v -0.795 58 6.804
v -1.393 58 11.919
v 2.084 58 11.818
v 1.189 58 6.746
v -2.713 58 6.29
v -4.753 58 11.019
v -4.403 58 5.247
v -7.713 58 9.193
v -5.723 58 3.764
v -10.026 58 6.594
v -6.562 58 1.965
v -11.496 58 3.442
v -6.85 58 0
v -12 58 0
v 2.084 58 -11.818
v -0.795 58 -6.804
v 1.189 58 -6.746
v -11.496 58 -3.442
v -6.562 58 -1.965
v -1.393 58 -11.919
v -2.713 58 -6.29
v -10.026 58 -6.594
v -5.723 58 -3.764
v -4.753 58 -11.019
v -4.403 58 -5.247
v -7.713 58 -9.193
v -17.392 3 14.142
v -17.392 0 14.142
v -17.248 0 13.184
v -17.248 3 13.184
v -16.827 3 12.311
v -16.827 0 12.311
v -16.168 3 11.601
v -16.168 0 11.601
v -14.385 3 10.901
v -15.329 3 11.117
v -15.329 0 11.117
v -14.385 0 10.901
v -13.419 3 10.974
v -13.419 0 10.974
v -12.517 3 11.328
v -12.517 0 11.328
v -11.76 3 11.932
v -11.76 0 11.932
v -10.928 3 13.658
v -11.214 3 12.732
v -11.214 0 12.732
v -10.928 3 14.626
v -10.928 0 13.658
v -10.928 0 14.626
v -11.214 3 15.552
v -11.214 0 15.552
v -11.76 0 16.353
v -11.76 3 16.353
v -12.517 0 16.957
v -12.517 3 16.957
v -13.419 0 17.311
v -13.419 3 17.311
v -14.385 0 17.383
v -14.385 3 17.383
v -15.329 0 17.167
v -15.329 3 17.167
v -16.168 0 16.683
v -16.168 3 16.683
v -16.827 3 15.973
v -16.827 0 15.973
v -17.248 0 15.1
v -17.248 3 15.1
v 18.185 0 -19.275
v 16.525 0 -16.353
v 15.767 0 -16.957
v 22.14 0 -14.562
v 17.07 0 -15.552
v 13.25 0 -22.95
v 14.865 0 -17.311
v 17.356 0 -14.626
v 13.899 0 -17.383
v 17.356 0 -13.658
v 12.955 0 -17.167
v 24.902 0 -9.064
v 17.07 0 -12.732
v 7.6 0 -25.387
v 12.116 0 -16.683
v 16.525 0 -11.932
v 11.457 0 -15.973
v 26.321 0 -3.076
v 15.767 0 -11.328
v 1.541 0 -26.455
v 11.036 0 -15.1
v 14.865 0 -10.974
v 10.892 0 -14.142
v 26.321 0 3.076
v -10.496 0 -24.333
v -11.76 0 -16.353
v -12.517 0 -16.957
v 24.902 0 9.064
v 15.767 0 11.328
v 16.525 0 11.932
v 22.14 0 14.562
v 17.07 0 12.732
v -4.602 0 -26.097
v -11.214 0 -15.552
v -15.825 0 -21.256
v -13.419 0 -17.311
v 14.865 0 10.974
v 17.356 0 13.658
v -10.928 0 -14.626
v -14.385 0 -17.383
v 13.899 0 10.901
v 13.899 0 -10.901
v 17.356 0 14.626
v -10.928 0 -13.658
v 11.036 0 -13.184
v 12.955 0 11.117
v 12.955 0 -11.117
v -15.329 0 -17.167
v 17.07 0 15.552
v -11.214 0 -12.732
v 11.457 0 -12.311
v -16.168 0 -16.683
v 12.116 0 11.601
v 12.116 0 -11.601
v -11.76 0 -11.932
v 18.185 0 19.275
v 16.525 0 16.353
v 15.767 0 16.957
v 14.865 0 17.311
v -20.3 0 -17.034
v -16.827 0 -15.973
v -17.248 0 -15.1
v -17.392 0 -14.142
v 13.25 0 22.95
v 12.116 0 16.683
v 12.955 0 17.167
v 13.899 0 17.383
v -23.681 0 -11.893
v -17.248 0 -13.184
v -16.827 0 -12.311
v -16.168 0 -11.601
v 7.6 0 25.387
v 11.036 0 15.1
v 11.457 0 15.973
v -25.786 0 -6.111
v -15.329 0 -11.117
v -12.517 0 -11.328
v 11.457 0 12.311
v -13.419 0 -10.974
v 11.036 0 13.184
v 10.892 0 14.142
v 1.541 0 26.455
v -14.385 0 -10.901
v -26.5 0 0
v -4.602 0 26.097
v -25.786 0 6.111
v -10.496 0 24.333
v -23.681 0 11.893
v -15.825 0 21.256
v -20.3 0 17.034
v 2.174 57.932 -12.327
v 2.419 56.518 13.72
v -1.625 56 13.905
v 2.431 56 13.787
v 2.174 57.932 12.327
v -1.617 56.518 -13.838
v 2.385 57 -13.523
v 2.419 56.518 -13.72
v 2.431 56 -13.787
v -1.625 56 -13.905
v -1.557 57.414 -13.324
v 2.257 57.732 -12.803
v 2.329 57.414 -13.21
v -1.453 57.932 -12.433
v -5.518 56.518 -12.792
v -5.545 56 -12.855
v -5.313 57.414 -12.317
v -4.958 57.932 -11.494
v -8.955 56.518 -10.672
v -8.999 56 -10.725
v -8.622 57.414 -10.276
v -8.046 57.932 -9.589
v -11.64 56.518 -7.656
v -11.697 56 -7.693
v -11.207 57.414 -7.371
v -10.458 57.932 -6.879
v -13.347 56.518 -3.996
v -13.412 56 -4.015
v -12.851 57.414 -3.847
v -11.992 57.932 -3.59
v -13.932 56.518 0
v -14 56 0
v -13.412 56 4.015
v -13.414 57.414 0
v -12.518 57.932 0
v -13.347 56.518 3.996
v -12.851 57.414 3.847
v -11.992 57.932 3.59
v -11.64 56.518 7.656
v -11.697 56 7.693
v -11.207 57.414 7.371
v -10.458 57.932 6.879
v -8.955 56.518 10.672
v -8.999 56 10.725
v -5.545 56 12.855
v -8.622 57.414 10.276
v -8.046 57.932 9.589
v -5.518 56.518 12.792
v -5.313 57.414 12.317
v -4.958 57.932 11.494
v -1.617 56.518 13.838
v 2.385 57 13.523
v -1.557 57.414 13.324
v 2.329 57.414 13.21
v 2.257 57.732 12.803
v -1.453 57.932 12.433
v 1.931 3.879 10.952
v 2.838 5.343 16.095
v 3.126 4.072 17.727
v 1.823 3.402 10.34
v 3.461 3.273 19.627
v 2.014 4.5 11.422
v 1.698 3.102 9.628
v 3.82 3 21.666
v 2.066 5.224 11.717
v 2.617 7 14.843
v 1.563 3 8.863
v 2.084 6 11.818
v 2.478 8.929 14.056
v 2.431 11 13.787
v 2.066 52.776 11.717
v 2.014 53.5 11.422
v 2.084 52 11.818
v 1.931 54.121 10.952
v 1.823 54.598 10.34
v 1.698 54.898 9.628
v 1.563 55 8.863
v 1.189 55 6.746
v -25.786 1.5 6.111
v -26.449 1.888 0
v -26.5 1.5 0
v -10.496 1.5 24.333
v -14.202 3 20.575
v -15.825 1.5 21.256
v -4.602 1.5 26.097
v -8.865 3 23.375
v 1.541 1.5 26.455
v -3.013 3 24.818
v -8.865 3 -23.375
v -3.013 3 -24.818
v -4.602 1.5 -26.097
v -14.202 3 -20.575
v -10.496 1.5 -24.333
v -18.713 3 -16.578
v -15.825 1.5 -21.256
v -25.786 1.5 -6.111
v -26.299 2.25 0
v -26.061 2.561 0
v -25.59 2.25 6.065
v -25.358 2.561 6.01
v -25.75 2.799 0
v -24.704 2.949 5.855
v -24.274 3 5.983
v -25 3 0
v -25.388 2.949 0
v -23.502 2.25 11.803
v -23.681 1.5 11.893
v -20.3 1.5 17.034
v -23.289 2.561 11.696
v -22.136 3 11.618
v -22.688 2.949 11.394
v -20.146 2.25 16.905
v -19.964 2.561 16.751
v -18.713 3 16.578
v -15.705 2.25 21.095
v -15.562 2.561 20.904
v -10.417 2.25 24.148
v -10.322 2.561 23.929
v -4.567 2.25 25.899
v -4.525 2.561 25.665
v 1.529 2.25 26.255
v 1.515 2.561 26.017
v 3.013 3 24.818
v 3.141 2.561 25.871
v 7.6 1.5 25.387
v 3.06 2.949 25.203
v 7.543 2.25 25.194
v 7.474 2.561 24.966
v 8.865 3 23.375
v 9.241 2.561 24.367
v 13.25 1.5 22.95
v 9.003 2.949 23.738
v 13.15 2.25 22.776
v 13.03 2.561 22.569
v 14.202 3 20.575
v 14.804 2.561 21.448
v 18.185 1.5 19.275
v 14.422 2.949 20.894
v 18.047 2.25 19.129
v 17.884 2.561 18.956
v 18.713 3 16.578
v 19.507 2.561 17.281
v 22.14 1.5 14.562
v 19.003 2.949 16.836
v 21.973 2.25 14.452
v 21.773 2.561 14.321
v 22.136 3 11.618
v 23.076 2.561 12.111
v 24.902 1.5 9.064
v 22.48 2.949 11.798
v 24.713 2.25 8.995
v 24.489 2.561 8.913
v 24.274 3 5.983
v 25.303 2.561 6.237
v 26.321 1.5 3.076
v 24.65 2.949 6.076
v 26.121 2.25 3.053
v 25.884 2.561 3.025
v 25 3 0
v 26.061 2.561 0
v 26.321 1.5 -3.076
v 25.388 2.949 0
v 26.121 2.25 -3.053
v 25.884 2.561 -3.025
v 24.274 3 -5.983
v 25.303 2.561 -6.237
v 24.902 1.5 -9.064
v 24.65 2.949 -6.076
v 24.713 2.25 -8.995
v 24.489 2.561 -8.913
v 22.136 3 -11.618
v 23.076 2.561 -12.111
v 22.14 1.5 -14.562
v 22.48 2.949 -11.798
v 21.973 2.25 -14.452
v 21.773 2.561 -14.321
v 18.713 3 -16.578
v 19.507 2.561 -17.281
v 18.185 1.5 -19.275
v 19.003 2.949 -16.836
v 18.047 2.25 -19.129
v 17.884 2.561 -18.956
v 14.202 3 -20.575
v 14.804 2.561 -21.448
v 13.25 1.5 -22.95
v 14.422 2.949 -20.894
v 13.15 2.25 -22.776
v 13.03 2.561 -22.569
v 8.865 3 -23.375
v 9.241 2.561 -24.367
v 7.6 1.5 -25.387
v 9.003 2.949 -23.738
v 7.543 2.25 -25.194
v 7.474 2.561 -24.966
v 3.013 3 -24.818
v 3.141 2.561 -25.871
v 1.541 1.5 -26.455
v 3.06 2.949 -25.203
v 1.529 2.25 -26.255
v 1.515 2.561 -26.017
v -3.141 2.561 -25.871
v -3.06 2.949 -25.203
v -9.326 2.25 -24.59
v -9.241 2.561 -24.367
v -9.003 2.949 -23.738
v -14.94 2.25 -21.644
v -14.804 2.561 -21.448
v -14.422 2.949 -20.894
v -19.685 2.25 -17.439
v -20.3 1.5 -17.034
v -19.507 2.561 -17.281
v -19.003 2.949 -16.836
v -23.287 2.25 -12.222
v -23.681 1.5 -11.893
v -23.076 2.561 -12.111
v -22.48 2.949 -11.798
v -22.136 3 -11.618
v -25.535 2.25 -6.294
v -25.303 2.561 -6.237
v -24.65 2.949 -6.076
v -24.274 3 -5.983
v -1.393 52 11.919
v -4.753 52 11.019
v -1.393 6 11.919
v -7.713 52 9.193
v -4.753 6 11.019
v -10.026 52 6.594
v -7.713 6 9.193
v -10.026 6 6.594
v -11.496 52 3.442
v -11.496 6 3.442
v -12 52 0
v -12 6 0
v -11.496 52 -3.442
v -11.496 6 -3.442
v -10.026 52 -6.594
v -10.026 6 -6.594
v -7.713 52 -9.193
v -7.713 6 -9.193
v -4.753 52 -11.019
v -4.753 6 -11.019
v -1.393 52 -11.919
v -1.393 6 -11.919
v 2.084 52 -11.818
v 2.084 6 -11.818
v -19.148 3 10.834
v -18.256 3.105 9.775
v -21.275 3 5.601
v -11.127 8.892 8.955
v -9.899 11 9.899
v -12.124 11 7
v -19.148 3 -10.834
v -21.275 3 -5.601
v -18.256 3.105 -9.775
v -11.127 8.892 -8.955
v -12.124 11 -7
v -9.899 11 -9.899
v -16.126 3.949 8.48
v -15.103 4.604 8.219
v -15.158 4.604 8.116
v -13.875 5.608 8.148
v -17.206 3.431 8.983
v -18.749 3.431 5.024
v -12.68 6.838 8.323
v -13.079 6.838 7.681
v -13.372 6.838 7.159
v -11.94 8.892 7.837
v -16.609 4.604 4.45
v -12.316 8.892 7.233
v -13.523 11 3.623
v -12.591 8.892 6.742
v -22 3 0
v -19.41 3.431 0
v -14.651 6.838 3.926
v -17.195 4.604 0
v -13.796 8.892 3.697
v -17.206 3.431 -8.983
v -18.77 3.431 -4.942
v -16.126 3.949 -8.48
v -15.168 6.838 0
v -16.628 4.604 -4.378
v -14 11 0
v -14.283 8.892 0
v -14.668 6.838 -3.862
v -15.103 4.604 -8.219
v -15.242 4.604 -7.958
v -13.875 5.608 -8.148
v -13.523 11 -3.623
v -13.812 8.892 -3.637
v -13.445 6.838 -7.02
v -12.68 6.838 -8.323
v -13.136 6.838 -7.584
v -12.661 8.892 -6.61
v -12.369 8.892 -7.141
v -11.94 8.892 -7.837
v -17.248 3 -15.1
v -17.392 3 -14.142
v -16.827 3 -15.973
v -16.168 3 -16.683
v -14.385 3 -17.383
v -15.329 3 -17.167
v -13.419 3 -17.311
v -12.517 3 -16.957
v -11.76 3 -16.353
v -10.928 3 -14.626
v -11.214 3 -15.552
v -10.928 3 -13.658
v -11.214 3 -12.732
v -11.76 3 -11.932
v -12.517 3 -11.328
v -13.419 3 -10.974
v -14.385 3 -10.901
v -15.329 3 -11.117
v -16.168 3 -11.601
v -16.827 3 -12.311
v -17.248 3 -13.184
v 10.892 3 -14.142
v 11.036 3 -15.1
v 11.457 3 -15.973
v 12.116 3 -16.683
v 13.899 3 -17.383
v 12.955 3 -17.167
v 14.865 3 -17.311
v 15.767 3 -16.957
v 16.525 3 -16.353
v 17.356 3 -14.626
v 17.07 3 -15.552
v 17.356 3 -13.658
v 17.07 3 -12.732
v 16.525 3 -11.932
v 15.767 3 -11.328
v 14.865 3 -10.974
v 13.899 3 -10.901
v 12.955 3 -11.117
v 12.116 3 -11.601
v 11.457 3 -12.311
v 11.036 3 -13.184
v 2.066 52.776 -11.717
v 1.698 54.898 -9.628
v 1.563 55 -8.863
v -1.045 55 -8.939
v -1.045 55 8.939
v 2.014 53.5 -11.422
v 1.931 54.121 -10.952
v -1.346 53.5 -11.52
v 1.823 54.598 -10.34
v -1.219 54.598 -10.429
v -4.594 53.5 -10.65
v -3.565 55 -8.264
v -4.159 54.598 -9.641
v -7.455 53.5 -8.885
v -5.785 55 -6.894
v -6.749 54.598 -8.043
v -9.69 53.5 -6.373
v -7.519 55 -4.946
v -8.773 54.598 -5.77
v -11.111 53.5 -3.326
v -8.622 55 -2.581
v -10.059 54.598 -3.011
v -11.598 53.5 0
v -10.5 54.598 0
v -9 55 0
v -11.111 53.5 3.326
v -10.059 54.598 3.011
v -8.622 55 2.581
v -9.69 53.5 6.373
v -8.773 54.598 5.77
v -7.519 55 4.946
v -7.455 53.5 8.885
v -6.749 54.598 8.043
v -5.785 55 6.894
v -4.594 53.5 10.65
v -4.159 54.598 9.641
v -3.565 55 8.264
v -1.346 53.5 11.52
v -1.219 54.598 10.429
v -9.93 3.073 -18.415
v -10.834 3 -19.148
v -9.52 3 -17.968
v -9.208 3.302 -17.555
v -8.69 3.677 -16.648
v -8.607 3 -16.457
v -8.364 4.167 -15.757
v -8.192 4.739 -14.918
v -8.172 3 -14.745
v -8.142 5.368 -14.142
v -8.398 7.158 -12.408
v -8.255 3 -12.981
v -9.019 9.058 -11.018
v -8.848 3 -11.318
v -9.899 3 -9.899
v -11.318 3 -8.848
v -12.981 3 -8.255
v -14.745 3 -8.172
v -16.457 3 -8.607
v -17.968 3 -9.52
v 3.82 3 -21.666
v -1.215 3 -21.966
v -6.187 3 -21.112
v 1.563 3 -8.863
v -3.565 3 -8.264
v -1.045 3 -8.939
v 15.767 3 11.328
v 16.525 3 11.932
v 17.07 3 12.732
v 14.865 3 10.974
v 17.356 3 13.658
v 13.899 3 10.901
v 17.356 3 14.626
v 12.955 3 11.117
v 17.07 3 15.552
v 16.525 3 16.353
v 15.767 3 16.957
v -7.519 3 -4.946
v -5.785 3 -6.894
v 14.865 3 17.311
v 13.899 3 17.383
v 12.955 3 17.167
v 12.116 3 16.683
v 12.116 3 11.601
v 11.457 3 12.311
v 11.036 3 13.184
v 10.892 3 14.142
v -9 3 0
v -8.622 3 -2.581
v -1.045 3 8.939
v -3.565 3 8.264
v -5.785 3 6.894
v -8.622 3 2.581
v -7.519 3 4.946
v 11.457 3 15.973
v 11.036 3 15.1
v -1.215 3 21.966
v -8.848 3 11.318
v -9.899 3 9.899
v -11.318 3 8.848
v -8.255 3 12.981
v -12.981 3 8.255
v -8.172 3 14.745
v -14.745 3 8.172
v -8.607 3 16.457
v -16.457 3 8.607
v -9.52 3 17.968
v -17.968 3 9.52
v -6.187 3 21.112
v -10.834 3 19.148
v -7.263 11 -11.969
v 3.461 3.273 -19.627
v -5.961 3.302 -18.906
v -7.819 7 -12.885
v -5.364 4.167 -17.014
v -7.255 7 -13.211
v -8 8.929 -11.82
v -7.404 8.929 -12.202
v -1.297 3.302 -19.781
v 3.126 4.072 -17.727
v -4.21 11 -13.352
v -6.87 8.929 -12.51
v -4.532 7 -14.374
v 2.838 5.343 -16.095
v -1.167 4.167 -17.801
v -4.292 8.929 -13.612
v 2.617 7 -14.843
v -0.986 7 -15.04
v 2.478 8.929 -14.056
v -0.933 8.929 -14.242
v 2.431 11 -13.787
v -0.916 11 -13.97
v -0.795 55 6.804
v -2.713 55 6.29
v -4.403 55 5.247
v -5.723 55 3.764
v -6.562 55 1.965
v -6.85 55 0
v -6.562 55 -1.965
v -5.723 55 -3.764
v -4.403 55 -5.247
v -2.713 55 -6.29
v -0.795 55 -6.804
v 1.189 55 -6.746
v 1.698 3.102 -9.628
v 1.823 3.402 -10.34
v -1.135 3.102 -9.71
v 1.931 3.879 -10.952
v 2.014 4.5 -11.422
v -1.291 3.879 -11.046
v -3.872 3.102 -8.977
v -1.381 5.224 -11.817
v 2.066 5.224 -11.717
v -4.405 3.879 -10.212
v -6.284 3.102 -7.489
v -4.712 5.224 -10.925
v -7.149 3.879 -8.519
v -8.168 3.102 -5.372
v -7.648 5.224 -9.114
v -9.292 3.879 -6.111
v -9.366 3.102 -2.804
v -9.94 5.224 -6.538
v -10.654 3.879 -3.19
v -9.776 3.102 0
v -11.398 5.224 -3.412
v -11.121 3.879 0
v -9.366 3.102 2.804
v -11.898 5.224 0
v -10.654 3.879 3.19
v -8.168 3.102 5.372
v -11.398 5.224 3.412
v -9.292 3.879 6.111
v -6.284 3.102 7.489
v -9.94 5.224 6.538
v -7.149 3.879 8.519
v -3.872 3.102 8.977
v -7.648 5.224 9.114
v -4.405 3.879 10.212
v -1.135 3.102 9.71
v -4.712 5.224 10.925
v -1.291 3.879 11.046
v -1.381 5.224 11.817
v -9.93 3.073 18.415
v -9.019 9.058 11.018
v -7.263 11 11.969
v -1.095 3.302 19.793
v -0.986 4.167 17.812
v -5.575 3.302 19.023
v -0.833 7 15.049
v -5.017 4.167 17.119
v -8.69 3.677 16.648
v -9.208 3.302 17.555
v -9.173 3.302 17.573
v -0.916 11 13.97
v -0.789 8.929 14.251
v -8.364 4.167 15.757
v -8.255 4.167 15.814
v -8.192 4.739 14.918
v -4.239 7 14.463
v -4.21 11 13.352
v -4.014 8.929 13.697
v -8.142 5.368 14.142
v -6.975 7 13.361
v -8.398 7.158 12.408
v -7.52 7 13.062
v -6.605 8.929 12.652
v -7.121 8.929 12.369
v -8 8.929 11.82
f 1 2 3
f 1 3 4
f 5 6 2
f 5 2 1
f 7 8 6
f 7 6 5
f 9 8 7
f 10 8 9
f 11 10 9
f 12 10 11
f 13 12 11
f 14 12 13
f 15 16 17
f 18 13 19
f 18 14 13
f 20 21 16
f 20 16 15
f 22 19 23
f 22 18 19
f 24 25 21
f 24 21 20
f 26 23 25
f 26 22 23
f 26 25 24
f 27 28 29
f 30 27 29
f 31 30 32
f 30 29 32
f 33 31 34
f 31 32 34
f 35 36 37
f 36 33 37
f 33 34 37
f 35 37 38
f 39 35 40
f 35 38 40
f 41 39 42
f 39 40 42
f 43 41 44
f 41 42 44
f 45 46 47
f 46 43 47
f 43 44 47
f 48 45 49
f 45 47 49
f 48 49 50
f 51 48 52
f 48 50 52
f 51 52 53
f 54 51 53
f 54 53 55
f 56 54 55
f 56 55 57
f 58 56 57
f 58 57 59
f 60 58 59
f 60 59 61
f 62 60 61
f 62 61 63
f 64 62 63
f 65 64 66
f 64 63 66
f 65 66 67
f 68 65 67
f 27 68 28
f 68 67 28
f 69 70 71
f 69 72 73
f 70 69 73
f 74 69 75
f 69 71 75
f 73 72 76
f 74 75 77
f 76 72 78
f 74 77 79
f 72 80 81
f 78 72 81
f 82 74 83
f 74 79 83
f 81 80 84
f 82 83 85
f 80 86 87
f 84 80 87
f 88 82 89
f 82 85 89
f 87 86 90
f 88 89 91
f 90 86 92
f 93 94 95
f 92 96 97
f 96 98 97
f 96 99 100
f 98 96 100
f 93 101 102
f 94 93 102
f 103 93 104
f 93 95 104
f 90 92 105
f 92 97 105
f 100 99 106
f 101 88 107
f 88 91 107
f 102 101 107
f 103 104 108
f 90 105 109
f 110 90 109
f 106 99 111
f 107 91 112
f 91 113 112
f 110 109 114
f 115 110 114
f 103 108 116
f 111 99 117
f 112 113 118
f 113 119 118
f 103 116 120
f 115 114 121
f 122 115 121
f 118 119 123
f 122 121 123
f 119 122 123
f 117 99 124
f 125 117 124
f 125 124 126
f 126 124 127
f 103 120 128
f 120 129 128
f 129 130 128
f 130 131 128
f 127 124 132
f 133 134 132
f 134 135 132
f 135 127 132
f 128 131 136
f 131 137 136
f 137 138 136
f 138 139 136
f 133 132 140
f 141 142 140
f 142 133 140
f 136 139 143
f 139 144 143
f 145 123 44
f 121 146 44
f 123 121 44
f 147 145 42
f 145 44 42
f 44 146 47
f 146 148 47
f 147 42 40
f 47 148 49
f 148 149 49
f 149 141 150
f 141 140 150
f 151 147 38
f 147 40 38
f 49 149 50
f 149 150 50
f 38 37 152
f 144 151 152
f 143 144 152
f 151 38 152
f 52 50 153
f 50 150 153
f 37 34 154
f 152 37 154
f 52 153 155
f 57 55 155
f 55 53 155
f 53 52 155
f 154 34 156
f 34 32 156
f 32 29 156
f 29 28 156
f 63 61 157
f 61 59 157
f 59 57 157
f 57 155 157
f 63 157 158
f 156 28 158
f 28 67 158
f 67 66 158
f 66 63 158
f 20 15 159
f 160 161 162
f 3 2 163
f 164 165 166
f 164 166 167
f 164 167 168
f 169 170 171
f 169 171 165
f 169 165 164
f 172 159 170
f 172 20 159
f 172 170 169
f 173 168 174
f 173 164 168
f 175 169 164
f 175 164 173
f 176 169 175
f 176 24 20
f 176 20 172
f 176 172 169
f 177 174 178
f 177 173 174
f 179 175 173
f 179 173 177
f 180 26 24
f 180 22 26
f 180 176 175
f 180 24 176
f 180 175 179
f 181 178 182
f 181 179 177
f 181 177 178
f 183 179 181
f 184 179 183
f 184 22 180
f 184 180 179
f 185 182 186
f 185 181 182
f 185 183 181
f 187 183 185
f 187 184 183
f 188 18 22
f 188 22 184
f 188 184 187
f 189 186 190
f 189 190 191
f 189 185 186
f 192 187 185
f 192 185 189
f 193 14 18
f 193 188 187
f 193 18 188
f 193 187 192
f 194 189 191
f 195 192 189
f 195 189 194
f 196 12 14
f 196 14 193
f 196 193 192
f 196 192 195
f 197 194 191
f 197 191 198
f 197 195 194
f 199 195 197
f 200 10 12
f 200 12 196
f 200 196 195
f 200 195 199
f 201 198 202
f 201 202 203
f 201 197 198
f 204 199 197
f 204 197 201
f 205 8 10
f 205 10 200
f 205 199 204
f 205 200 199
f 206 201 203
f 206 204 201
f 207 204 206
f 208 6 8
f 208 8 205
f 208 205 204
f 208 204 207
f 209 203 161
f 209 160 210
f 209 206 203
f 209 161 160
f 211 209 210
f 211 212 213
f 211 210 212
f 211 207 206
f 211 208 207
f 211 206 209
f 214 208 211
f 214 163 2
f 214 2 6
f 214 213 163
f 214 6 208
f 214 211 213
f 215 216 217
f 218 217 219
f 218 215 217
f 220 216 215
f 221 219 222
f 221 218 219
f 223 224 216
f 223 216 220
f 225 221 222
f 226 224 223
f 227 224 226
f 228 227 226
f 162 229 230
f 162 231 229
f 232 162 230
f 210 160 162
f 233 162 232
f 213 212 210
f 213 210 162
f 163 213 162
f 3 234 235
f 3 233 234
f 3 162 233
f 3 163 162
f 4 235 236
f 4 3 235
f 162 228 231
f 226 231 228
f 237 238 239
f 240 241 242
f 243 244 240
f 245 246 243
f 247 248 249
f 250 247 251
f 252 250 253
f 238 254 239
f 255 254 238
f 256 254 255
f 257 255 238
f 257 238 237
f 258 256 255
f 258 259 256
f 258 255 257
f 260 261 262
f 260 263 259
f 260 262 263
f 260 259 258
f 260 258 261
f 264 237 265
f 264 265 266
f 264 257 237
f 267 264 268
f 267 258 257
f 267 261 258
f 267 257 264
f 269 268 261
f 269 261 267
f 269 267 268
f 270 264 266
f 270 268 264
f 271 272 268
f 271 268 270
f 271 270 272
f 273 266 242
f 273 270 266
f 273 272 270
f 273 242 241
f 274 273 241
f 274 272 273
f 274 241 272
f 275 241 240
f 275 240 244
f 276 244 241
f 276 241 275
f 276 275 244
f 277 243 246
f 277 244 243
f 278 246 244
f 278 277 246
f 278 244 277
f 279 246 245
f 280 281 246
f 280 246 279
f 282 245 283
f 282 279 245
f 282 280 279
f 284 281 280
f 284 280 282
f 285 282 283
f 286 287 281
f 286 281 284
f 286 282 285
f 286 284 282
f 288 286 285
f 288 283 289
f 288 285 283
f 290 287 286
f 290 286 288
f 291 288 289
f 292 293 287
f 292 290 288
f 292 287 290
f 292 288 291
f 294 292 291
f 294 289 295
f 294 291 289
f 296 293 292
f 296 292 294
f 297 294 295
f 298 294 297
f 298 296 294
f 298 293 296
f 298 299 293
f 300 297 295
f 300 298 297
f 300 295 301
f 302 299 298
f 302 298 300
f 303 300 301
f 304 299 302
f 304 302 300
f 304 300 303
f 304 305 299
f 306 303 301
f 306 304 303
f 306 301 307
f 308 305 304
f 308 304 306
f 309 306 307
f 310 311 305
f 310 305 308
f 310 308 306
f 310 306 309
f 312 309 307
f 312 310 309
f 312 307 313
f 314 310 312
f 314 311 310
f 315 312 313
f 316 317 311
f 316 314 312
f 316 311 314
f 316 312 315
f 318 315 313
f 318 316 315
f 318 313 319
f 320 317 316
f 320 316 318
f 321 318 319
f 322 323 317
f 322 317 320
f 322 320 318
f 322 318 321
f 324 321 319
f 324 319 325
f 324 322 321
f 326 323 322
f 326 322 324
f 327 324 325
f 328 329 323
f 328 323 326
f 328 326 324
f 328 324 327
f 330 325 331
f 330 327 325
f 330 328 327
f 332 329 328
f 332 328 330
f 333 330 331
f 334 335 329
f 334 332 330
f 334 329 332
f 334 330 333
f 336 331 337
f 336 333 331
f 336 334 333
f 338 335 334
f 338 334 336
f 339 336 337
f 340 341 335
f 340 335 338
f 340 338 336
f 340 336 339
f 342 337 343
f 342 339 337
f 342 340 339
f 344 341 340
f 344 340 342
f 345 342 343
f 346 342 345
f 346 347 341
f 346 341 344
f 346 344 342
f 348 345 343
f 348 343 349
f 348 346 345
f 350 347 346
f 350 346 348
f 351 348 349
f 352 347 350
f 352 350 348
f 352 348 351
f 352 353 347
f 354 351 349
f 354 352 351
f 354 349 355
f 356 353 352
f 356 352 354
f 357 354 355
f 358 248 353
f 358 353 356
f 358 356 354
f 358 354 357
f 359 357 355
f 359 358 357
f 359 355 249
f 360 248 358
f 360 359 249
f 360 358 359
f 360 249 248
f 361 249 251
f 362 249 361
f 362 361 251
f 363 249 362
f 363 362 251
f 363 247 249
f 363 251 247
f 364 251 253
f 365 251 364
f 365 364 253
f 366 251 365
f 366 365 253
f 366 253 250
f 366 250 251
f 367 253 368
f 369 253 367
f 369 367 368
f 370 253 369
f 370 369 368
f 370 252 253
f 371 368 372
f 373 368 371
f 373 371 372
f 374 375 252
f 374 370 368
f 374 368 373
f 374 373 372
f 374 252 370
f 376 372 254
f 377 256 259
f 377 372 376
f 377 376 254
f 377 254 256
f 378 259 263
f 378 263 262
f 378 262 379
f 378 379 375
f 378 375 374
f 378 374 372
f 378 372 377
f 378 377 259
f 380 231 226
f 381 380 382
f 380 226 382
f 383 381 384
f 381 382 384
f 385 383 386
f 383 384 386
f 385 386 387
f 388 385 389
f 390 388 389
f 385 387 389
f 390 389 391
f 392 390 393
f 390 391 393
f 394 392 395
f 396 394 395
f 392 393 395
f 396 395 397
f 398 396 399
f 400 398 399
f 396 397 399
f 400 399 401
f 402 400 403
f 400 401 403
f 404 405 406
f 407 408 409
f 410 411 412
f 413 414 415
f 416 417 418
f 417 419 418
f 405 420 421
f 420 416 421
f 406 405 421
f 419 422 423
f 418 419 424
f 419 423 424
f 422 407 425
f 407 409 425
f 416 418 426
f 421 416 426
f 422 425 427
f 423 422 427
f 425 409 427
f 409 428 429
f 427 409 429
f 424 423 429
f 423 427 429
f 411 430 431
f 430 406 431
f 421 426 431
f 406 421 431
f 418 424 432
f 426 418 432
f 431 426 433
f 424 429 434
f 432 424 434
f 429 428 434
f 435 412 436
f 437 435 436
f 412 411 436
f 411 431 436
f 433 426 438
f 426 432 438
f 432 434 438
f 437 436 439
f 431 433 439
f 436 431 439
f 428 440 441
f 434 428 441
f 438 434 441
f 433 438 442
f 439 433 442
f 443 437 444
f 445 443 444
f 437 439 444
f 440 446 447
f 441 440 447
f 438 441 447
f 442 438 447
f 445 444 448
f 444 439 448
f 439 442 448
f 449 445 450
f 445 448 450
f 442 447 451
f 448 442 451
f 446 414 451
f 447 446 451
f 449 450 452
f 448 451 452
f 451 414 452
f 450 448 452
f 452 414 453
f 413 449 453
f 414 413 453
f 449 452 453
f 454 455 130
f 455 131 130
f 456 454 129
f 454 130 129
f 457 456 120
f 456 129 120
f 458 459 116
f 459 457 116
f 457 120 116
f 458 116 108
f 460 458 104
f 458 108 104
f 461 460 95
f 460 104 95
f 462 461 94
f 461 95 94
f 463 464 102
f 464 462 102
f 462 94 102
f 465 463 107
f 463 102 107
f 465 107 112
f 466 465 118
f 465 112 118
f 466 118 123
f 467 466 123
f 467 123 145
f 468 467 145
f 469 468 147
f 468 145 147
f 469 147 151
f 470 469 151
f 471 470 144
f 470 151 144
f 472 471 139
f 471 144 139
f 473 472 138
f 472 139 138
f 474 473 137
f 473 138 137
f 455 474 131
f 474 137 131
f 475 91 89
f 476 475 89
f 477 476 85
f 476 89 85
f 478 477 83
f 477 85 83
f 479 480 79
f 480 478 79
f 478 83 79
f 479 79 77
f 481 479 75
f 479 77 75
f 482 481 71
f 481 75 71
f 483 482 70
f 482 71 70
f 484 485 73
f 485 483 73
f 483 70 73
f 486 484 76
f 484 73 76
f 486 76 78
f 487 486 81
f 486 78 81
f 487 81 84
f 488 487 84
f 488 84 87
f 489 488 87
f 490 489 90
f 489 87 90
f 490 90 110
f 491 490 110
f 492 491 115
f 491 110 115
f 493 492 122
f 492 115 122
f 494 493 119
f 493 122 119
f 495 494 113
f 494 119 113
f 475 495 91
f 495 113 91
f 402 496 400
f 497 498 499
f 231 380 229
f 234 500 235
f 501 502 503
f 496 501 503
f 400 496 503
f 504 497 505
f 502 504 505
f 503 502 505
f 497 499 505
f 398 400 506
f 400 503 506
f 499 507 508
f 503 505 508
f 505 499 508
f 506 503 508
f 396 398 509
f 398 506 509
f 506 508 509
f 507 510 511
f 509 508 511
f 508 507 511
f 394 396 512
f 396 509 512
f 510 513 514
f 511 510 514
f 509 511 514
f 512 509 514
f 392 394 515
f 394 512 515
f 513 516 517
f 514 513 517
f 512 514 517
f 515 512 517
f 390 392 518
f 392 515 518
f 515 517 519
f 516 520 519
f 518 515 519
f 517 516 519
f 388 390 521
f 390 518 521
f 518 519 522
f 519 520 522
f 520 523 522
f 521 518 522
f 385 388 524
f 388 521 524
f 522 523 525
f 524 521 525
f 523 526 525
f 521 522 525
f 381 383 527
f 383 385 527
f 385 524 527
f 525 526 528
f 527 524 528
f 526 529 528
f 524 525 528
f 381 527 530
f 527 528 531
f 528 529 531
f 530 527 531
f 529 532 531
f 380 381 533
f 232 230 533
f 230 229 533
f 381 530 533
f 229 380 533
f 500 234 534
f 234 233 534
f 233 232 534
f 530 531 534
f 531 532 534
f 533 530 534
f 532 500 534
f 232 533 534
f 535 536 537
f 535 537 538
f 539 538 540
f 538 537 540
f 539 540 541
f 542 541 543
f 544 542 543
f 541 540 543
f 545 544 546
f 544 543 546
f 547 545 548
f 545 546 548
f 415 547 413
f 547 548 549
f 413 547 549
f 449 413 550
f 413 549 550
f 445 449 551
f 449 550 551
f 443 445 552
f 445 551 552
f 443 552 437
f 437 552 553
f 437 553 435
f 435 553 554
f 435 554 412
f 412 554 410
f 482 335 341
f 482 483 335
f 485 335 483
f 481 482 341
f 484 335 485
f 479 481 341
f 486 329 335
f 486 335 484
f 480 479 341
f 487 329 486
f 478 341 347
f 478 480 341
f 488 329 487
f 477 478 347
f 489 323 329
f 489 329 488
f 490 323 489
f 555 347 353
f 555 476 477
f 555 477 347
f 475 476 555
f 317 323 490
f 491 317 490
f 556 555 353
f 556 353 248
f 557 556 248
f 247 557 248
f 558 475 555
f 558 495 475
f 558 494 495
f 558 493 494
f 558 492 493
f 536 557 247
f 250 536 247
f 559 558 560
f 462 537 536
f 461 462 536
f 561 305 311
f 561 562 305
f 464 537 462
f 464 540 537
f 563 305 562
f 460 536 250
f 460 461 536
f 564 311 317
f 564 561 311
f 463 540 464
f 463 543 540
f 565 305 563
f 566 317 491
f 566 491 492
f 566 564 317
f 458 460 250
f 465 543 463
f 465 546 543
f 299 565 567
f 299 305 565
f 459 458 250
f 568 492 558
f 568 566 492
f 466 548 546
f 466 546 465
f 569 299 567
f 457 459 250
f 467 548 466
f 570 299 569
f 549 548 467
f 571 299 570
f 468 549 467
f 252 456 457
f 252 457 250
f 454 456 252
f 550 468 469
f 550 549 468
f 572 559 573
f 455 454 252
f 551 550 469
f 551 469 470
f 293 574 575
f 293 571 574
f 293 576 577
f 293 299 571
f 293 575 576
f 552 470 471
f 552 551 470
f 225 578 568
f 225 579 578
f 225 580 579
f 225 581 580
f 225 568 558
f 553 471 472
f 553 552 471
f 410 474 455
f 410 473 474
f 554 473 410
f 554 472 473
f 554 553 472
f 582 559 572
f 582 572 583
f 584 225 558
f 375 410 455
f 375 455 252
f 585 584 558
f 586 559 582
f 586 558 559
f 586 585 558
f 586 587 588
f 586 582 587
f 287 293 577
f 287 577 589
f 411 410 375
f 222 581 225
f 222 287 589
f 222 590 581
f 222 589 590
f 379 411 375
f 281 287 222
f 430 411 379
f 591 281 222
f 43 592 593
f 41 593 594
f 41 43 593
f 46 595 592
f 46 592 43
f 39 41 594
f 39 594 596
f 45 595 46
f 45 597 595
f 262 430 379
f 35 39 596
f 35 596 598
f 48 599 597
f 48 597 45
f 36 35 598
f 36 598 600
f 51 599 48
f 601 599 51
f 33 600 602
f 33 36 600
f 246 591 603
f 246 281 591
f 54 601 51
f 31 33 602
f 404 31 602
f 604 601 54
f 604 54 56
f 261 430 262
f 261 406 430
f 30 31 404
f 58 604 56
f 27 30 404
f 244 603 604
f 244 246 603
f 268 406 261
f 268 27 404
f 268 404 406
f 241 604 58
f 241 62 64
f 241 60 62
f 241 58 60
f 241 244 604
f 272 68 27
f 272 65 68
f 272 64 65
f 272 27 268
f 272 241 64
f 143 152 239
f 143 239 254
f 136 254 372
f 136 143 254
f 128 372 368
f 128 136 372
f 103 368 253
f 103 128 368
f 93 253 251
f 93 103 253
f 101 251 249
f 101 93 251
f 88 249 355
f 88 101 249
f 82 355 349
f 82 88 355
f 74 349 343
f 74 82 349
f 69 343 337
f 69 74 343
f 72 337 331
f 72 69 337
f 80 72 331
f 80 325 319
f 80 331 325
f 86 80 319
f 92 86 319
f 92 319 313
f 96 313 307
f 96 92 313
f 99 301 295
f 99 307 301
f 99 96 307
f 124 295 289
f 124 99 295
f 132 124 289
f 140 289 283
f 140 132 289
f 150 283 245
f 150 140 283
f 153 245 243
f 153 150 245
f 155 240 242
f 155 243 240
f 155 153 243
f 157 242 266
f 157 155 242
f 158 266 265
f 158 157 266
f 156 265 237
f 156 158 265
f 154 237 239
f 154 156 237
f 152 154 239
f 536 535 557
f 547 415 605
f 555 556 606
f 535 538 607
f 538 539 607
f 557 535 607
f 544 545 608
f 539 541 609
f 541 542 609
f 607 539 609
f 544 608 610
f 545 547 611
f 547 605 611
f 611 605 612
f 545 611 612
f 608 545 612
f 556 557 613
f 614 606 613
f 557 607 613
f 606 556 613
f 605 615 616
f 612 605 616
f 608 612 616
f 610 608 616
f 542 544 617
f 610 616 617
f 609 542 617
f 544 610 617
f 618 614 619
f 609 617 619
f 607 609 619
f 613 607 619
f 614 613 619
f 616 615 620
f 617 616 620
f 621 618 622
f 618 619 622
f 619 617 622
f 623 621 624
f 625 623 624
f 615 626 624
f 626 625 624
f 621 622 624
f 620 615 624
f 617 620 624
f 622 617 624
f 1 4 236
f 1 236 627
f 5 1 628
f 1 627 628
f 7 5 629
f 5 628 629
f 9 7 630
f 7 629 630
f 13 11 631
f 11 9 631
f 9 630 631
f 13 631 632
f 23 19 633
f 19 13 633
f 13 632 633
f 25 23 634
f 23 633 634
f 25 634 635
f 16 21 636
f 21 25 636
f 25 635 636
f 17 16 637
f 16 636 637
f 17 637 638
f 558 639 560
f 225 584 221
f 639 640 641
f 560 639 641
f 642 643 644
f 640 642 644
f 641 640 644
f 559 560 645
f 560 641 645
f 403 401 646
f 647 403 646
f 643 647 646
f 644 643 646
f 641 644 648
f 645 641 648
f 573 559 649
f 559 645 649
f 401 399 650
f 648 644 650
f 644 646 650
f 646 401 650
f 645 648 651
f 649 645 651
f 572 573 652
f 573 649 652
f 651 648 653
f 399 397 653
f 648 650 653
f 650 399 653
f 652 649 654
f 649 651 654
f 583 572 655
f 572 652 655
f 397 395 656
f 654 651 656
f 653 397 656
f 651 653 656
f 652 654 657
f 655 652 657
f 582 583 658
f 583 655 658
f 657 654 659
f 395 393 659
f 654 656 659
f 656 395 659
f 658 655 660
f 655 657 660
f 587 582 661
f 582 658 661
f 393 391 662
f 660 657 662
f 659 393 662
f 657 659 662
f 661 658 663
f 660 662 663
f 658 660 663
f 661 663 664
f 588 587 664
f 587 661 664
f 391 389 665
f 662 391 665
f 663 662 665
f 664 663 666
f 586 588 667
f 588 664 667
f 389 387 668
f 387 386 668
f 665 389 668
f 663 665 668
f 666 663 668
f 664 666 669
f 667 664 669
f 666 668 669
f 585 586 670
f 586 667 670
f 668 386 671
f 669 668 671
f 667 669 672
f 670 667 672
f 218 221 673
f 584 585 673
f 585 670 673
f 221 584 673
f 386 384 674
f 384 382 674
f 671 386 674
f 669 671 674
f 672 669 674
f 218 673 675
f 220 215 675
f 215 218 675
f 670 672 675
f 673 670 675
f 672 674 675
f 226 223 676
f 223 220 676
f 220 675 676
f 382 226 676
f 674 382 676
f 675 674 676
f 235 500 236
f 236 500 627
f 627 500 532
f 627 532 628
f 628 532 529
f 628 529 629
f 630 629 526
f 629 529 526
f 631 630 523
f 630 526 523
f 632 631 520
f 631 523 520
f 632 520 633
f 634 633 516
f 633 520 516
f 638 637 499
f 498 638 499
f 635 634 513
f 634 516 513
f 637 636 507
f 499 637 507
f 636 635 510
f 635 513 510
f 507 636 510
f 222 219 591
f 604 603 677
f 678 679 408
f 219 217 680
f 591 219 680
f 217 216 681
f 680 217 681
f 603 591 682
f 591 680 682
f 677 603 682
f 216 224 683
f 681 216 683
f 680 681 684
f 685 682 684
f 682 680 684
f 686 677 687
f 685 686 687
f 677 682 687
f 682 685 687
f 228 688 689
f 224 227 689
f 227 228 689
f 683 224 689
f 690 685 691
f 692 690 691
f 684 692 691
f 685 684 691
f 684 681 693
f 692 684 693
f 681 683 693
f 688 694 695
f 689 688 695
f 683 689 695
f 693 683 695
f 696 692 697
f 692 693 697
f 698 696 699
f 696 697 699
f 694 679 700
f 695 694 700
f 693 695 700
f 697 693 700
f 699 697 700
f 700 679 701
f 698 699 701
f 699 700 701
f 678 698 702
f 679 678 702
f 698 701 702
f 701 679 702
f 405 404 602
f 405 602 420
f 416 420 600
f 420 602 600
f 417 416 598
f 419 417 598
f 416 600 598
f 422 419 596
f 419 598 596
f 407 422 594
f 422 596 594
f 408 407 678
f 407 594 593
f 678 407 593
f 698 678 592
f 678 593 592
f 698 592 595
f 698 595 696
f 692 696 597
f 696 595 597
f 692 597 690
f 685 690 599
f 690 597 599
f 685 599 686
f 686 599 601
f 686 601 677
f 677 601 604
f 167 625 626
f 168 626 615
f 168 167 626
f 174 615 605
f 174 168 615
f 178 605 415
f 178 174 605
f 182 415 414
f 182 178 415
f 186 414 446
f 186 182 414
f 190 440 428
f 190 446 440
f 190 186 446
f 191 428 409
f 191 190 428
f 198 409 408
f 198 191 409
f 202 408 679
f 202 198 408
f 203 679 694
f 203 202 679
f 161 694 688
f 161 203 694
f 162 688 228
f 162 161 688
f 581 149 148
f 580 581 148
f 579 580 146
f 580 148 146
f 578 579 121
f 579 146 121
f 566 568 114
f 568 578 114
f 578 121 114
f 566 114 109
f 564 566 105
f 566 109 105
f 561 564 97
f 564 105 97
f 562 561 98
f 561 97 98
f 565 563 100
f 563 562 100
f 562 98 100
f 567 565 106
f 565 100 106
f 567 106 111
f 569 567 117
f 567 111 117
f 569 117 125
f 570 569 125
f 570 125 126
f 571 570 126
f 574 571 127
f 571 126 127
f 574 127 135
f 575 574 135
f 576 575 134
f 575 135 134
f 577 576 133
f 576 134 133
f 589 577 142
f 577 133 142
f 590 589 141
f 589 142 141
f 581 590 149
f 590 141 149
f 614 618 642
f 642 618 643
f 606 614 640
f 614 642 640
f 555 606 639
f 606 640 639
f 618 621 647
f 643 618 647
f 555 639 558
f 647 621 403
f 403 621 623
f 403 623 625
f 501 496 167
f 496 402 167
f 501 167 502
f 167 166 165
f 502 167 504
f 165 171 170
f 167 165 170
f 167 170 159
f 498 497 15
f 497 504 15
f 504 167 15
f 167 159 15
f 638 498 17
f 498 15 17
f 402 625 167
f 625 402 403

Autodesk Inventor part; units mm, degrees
ref_plane "YZ Plane" through (0, 0, 0) normal (1, 0, 0) x (0, 1, 0)
ref_plane "XZ Plane" through (0, 0, 0) normal (0, 1, 0) x (-1, 0, 0)
ref_plane "XY Plane" through (0, 0, 0) normal (0, 0, 1) x (1, 0, 0)
sketch "Sketch1" plane through (0, 0, 0) normal (0, 1, 0) x (-1, 0, 0)
  circle A0 centre (0, 0) radius 26.5
  circle A1 centre (-14.1421, 14.1421) radius 3.25
  circle A2 centre (-14.1421, -14.1421) radius 3.25
  circle A3 centre (14.1421, -14.1421) radius 3.25
  circle A4 centre (14.1421, 14.1421) radius 3.25
  line L0 (0, 0) -> (0, 26.5) construction
  line L1 (0, 0) -> (-18.7383, 18.7383) construction
  dimension "d0" = 53
  dimension "d1" = 6.5
  dimension "d2" = 20
  dimension "d5" = 360
  dimension "d9" = 45
extrude "Extrusion1" add sketch "Sketch1" along normal blind 3
sketch "Sketch2" plane through (0, 0, 0) normal (0, 0, 1) x (1, 0, 0)
  line L0 (26.5, 3) -> (-26.5, 3) projected
  line L1 (-12, 3) -> (-14, 3)
  line L2 (-14, 3) -> (-14, 58)
  line L3 (-14, 58) -> (-12, 58)
  line L4 (-12, 58) -> (-12, 3)
  line L5 (-14, 58) -> (-6.85, 58)
  line L6 (-6.85, 58) -> (-6.85, 55)
  line L7 (-6.85, 55) -> (-14, 55)
  line L8 (-14, 55) -> (-14, 58)
  line L9 (0, -11.6) -> (0, 69.6) projected
  point P0 (0, 0)
  point P1 (-12, 55)
  dimension "d10" = 12
  dimension "d11" = 6.85
  dimension "d12" = 2
  dimension "d13" = 55
  dimension "d14" = 3
revolve "Revolution1" add sketch "Sketch2" angle 200 mid plane about axis through (0, -10, 0) along (0, 1, 0)
fillet "Fillet1" radius 8 1 edges at (-14, 3, 0)
fillet "Fillet1" radius 3 1 edges at (-12, 55, 0)
fillet "Fillet1" radius 3 1 edges at (-12, 3, 0)
fillet "Fillet1" radius 2 1 edges at (-14, 58, 0)
fillet "Fillet1" radius 1.5 1 edges at (26.5, 3, 0)
sketch "Sketch3" plane through (0, 3, 0) normal (0, 1, 0) x (1, 0, 0)
  circle A0 centre (14.1421, 14.1421) radius 3.25 projected
  circle A1 centre (14.1421, 14.1421) radius 6
  circle A2 centre (-14.1421, 14.1421) radius 6
  circle A3 centre (-14.1421, -14.1421) radius 6
  circle A4 centre (14.1421, -14.1421) radius 6
  arc A5 (2.4311, 13.7873) -> (2.4311, -13.7873) centre (0, 0) ccw projected
  dimension "d23" = 360
  dimension "d27" = 12
extrude "Extrusion2" cut sketch "Sketch3" along normal blind 8 contours A0 | A1 | A2 | A3 | A4
properties part number "_3DPrint"
